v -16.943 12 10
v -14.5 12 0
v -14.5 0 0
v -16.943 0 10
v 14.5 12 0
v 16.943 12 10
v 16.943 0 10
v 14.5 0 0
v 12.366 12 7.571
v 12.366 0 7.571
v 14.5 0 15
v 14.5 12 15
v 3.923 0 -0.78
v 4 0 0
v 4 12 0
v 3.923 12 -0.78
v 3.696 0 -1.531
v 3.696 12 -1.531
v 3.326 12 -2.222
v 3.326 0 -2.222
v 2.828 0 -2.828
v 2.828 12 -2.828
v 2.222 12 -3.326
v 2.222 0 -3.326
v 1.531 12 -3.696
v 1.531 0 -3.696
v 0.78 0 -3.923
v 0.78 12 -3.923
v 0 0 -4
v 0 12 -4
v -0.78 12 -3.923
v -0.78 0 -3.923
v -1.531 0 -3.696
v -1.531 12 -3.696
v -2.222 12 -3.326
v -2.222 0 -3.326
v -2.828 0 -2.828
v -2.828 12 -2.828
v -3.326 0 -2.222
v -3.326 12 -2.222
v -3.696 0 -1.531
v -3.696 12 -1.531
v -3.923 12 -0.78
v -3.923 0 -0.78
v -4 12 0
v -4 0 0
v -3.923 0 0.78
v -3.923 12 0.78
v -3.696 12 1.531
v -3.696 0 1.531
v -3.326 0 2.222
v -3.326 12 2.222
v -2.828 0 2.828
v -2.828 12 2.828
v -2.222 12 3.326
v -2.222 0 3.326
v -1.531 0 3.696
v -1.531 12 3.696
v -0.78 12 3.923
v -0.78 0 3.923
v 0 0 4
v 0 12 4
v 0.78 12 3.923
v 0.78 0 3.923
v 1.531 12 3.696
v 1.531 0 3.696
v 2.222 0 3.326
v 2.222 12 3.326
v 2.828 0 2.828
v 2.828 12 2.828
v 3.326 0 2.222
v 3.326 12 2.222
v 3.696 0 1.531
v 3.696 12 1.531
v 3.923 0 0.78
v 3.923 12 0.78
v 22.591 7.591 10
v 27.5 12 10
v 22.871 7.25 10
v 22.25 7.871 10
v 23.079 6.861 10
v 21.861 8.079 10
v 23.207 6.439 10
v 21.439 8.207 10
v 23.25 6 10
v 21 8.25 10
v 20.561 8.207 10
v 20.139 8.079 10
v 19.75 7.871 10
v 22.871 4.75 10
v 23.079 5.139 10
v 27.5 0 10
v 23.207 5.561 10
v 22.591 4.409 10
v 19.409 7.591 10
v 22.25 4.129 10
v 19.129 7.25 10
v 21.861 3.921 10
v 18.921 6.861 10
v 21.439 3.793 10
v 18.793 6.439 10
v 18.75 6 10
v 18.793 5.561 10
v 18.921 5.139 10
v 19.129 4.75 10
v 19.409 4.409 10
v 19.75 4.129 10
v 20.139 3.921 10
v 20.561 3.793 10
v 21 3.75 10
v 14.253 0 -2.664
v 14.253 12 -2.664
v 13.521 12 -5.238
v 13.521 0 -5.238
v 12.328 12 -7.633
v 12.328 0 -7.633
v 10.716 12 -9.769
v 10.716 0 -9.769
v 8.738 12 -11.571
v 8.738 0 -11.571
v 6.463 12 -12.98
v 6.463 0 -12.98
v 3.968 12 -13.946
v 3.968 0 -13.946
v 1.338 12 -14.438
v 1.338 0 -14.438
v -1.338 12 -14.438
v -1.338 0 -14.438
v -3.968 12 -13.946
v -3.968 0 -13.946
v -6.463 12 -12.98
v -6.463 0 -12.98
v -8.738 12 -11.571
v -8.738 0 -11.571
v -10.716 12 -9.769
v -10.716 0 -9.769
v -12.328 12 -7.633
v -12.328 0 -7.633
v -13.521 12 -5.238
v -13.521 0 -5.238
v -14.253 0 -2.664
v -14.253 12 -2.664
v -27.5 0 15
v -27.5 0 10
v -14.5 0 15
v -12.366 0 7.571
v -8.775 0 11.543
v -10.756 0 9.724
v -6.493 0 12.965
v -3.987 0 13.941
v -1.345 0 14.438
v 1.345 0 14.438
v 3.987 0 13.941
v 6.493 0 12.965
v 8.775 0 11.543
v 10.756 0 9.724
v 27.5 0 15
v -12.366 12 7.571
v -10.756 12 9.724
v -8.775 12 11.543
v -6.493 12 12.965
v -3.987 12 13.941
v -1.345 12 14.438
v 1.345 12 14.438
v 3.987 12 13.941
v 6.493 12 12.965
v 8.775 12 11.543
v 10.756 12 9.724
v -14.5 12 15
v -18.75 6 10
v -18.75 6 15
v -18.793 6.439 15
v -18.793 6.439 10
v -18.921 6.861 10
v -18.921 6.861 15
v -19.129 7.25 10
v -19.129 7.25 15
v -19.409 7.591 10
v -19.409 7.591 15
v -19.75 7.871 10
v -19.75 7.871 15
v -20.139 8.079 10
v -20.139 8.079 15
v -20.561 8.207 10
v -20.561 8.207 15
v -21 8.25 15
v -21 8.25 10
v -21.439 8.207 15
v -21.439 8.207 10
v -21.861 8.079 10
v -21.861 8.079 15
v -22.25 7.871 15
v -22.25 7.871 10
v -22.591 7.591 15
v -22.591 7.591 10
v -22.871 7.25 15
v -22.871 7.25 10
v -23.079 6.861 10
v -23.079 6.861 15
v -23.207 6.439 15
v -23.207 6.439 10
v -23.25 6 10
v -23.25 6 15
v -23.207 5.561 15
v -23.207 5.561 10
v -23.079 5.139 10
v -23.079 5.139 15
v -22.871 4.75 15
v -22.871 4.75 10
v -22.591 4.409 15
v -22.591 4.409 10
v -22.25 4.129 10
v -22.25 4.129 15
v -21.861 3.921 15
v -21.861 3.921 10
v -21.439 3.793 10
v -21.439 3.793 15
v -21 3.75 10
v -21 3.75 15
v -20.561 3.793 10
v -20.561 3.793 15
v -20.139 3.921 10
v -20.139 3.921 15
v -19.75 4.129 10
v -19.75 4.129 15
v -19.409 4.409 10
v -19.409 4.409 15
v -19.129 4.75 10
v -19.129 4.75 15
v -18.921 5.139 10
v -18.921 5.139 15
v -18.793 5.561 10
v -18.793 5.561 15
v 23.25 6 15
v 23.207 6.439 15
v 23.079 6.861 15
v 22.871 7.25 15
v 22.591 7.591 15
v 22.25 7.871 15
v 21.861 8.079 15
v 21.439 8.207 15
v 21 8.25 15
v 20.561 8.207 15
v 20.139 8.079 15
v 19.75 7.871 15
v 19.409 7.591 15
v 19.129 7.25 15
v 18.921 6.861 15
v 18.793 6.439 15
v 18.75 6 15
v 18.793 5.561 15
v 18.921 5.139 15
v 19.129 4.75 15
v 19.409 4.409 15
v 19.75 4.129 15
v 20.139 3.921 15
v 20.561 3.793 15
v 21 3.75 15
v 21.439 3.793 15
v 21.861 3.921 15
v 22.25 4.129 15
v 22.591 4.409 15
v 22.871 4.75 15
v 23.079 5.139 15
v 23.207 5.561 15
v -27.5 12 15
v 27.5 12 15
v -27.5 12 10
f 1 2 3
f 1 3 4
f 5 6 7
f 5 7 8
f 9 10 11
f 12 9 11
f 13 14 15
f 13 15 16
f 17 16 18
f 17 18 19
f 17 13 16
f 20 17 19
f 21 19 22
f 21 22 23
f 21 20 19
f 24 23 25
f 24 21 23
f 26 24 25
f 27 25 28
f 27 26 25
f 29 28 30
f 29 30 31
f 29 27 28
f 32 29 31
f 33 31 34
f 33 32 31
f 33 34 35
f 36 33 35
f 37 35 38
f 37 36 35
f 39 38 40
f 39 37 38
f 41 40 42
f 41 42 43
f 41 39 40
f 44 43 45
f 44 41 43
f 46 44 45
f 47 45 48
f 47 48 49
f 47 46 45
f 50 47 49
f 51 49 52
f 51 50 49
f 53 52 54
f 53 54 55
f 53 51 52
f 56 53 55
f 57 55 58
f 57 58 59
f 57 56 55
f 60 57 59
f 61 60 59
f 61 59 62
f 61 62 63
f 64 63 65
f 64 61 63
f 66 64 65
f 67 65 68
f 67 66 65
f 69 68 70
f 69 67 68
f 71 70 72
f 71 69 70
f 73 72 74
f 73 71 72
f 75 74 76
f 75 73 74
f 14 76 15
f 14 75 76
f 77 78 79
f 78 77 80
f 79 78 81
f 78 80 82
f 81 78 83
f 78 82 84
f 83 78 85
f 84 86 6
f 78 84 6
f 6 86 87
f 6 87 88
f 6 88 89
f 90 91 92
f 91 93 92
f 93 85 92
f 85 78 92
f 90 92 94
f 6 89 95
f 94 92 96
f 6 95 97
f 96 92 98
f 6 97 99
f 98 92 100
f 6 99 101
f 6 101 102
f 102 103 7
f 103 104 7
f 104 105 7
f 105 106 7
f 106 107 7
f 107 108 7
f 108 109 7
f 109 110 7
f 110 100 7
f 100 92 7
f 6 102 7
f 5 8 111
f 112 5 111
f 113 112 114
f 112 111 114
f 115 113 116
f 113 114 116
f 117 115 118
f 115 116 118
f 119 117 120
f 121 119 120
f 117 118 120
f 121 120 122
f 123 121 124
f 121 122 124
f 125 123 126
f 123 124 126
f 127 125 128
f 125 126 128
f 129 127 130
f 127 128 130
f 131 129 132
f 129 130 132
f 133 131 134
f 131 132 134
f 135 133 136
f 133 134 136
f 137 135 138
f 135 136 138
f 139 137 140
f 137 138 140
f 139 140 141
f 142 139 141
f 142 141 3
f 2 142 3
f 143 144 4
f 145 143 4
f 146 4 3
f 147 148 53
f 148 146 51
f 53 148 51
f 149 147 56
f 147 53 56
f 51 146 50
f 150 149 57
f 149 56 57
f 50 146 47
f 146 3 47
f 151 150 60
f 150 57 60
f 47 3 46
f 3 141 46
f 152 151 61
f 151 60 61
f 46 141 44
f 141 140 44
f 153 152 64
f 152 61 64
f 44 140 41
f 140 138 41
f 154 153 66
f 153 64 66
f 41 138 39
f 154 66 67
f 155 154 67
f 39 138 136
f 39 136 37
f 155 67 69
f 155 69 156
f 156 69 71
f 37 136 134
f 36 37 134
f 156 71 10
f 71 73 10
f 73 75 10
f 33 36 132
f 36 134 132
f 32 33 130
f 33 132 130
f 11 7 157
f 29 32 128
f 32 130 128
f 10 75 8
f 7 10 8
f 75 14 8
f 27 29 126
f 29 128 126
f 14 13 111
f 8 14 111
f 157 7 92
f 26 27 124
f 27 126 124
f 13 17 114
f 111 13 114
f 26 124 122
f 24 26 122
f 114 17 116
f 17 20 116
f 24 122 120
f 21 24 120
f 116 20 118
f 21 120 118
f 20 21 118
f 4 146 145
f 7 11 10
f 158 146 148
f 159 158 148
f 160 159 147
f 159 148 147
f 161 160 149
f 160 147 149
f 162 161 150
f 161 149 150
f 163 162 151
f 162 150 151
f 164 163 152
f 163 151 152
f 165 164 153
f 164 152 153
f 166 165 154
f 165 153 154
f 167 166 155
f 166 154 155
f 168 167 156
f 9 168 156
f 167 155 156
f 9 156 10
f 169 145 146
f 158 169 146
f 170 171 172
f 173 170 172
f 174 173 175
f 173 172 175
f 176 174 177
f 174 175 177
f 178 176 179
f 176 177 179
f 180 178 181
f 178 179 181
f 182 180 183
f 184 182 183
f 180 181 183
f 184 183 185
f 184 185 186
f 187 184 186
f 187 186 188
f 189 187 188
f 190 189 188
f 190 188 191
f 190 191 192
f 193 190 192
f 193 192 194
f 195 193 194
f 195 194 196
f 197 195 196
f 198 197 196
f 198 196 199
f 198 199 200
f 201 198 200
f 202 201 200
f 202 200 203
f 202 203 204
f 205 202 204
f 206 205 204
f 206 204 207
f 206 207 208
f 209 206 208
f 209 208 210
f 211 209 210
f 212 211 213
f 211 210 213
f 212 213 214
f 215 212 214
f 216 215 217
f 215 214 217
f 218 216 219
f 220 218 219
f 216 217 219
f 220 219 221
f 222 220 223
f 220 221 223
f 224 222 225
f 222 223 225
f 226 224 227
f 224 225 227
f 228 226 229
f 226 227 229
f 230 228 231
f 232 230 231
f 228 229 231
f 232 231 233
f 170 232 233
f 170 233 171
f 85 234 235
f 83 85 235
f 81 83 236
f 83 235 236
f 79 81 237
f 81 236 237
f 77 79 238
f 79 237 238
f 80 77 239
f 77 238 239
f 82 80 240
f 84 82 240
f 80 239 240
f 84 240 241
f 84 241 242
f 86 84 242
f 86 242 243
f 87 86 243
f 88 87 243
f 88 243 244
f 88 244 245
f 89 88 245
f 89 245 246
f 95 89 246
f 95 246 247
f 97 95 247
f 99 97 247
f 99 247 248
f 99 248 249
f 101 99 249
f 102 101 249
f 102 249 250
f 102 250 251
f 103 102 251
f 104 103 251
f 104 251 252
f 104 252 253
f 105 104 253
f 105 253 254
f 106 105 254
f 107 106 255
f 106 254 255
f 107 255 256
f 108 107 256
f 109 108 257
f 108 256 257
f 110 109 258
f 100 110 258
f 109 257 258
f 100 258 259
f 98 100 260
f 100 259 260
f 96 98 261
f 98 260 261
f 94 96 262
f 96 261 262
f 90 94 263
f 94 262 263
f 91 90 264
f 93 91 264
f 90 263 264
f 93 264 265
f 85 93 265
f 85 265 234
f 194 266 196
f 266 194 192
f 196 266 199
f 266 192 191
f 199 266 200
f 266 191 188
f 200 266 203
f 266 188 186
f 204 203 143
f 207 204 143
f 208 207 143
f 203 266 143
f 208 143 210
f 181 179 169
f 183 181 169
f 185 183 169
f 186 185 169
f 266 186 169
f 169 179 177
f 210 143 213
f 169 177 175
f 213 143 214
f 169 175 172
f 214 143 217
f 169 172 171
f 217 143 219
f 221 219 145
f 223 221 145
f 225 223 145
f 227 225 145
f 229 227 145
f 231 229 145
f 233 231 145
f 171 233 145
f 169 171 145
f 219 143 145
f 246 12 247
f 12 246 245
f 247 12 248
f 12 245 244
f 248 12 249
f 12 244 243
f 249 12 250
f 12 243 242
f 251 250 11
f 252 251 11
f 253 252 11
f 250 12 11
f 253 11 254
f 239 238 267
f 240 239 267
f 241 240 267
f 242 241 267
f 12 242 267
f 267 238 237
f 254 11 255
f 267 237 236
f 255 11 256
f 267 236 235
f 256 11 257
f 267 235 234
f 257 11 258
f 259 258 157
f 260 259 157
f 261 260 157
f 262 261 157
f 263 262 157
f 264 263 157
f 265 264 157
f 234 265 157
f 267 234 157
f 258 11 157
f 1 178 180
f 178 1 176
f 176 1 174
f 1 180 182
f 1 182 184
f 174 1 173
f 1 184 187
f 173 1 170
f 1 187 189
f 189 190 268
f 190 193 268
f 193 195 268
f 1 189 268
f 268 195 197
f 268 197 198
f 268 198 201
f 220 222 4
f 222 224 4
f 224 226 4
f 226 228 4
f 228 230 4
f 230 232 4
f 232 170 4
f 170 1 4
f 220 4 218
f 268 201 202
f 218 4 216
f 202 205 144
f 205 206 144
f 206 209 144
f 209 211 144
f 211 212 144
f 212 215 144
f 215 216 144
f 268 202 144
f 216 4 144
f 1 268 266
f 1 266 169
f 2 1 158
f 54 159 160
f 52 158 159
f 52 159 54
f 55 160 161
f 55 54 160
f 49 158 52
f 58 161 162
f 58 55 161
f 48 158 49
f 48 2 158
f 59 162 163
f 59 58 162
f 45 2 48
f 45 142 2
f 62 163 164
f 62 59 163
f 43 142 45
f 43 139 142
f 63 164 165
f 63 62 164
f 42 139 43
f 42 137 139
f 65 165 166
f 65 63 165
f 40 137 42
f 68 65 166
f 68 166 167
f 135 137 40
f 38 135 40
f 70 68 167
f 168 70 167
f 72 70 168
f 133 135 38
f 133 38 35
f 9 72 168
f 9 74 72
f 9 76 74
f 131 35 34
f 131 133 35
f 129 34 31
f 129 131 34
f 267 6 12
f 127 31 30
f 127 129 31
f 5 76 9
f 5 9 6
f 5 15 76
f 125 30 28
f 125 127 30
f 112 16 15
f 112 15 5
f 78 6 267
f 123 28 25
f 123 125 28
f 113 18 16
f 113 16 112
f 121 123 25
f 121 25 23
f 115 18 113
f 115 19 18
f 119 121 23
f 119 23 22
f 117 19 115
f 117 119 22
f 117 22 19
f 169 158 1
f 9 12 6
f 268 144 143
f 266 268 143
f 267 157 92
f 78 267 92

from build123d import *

# Parameters (mm, degrees)
SKETCH1_R           = 4
BOSS_EXTRUDE1_DEPTH = 12
SKETCH2_R           = 2.25
CUT_EXTRUDE1_DEPTH  = 12


with BuildPart() as part:
    # Sketch1 → Boss-Extrude1 (new body)
    with BuildSketch(Plane(origin=(0, 0, 0), x_dir=(1, 0, 0), z_dir=(0, 1, 0))):
        with BuildLine():
            Line((-27.5, -10), (-27.5, -15))
            Line((-27.5, -15), (-14.5, -15))
            Line((-14.5, -15), (-12.366440747, -7.571072794))
            ThreePointArc((-12.366440747, -7.571072794), (0, -14.5), (12.366440747, -7.571072794))
            Line((12.366440747, -7.571072794), (14.5, -15))
            Line((14.5, -15), (27.5, -15))
            Line((27.5, -15), (27.5, -10))
            Line((27.5, -10), (16.942866484, -10))
            Line((16.942866484, -10), (14.5, 0))
            ThreePointArc((14.5, 0), (0, 14.5), (-14.5, 0))
            Line((-14.5, 0), (-16.942866484, -10))
            Line((-16.942866484, -10), (-27.5, -10))
        make_face()
        Circle(SKETCH1_R, mode=Mode.SUBTRACT)
    extrude(amount=BOSS_EXTRUDE1_DEPTH)

    # Sketch2 → Cut-Extrude1 (cut)
    with BuildSketch(Plane.XY.offset(15)):
        with Locations((-21, 6)):
            Circle(SKETCH2_R)
        with Locations((21, 6)):
            Circle(SKETCH2_R)
    extrude(amount=-CUT_EXTRUDE1_DEPTH, mode=Mode.SUBTRACT)


solid = part.part
